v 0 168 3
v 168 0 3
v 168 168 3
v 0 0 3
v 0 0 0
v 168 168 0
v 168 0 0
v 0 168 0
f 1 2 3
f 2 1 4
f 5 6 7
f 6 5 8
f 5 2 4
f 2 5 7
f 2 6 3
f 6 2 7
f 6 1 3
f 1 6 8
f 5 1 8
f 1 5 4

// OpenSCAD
translate(v = [17, 17, 5]) { 

union() {

linear_extrude(file = "newgridgrid.dxf", height = 5, center = true);
linear_extrude(file = "newgridnum.dxf", height = 10, center = true);
linear_extrude(file = "Unemp.dxf", height = 10, center = true);

}}

cube(size = [168,168,3], center = false);	
